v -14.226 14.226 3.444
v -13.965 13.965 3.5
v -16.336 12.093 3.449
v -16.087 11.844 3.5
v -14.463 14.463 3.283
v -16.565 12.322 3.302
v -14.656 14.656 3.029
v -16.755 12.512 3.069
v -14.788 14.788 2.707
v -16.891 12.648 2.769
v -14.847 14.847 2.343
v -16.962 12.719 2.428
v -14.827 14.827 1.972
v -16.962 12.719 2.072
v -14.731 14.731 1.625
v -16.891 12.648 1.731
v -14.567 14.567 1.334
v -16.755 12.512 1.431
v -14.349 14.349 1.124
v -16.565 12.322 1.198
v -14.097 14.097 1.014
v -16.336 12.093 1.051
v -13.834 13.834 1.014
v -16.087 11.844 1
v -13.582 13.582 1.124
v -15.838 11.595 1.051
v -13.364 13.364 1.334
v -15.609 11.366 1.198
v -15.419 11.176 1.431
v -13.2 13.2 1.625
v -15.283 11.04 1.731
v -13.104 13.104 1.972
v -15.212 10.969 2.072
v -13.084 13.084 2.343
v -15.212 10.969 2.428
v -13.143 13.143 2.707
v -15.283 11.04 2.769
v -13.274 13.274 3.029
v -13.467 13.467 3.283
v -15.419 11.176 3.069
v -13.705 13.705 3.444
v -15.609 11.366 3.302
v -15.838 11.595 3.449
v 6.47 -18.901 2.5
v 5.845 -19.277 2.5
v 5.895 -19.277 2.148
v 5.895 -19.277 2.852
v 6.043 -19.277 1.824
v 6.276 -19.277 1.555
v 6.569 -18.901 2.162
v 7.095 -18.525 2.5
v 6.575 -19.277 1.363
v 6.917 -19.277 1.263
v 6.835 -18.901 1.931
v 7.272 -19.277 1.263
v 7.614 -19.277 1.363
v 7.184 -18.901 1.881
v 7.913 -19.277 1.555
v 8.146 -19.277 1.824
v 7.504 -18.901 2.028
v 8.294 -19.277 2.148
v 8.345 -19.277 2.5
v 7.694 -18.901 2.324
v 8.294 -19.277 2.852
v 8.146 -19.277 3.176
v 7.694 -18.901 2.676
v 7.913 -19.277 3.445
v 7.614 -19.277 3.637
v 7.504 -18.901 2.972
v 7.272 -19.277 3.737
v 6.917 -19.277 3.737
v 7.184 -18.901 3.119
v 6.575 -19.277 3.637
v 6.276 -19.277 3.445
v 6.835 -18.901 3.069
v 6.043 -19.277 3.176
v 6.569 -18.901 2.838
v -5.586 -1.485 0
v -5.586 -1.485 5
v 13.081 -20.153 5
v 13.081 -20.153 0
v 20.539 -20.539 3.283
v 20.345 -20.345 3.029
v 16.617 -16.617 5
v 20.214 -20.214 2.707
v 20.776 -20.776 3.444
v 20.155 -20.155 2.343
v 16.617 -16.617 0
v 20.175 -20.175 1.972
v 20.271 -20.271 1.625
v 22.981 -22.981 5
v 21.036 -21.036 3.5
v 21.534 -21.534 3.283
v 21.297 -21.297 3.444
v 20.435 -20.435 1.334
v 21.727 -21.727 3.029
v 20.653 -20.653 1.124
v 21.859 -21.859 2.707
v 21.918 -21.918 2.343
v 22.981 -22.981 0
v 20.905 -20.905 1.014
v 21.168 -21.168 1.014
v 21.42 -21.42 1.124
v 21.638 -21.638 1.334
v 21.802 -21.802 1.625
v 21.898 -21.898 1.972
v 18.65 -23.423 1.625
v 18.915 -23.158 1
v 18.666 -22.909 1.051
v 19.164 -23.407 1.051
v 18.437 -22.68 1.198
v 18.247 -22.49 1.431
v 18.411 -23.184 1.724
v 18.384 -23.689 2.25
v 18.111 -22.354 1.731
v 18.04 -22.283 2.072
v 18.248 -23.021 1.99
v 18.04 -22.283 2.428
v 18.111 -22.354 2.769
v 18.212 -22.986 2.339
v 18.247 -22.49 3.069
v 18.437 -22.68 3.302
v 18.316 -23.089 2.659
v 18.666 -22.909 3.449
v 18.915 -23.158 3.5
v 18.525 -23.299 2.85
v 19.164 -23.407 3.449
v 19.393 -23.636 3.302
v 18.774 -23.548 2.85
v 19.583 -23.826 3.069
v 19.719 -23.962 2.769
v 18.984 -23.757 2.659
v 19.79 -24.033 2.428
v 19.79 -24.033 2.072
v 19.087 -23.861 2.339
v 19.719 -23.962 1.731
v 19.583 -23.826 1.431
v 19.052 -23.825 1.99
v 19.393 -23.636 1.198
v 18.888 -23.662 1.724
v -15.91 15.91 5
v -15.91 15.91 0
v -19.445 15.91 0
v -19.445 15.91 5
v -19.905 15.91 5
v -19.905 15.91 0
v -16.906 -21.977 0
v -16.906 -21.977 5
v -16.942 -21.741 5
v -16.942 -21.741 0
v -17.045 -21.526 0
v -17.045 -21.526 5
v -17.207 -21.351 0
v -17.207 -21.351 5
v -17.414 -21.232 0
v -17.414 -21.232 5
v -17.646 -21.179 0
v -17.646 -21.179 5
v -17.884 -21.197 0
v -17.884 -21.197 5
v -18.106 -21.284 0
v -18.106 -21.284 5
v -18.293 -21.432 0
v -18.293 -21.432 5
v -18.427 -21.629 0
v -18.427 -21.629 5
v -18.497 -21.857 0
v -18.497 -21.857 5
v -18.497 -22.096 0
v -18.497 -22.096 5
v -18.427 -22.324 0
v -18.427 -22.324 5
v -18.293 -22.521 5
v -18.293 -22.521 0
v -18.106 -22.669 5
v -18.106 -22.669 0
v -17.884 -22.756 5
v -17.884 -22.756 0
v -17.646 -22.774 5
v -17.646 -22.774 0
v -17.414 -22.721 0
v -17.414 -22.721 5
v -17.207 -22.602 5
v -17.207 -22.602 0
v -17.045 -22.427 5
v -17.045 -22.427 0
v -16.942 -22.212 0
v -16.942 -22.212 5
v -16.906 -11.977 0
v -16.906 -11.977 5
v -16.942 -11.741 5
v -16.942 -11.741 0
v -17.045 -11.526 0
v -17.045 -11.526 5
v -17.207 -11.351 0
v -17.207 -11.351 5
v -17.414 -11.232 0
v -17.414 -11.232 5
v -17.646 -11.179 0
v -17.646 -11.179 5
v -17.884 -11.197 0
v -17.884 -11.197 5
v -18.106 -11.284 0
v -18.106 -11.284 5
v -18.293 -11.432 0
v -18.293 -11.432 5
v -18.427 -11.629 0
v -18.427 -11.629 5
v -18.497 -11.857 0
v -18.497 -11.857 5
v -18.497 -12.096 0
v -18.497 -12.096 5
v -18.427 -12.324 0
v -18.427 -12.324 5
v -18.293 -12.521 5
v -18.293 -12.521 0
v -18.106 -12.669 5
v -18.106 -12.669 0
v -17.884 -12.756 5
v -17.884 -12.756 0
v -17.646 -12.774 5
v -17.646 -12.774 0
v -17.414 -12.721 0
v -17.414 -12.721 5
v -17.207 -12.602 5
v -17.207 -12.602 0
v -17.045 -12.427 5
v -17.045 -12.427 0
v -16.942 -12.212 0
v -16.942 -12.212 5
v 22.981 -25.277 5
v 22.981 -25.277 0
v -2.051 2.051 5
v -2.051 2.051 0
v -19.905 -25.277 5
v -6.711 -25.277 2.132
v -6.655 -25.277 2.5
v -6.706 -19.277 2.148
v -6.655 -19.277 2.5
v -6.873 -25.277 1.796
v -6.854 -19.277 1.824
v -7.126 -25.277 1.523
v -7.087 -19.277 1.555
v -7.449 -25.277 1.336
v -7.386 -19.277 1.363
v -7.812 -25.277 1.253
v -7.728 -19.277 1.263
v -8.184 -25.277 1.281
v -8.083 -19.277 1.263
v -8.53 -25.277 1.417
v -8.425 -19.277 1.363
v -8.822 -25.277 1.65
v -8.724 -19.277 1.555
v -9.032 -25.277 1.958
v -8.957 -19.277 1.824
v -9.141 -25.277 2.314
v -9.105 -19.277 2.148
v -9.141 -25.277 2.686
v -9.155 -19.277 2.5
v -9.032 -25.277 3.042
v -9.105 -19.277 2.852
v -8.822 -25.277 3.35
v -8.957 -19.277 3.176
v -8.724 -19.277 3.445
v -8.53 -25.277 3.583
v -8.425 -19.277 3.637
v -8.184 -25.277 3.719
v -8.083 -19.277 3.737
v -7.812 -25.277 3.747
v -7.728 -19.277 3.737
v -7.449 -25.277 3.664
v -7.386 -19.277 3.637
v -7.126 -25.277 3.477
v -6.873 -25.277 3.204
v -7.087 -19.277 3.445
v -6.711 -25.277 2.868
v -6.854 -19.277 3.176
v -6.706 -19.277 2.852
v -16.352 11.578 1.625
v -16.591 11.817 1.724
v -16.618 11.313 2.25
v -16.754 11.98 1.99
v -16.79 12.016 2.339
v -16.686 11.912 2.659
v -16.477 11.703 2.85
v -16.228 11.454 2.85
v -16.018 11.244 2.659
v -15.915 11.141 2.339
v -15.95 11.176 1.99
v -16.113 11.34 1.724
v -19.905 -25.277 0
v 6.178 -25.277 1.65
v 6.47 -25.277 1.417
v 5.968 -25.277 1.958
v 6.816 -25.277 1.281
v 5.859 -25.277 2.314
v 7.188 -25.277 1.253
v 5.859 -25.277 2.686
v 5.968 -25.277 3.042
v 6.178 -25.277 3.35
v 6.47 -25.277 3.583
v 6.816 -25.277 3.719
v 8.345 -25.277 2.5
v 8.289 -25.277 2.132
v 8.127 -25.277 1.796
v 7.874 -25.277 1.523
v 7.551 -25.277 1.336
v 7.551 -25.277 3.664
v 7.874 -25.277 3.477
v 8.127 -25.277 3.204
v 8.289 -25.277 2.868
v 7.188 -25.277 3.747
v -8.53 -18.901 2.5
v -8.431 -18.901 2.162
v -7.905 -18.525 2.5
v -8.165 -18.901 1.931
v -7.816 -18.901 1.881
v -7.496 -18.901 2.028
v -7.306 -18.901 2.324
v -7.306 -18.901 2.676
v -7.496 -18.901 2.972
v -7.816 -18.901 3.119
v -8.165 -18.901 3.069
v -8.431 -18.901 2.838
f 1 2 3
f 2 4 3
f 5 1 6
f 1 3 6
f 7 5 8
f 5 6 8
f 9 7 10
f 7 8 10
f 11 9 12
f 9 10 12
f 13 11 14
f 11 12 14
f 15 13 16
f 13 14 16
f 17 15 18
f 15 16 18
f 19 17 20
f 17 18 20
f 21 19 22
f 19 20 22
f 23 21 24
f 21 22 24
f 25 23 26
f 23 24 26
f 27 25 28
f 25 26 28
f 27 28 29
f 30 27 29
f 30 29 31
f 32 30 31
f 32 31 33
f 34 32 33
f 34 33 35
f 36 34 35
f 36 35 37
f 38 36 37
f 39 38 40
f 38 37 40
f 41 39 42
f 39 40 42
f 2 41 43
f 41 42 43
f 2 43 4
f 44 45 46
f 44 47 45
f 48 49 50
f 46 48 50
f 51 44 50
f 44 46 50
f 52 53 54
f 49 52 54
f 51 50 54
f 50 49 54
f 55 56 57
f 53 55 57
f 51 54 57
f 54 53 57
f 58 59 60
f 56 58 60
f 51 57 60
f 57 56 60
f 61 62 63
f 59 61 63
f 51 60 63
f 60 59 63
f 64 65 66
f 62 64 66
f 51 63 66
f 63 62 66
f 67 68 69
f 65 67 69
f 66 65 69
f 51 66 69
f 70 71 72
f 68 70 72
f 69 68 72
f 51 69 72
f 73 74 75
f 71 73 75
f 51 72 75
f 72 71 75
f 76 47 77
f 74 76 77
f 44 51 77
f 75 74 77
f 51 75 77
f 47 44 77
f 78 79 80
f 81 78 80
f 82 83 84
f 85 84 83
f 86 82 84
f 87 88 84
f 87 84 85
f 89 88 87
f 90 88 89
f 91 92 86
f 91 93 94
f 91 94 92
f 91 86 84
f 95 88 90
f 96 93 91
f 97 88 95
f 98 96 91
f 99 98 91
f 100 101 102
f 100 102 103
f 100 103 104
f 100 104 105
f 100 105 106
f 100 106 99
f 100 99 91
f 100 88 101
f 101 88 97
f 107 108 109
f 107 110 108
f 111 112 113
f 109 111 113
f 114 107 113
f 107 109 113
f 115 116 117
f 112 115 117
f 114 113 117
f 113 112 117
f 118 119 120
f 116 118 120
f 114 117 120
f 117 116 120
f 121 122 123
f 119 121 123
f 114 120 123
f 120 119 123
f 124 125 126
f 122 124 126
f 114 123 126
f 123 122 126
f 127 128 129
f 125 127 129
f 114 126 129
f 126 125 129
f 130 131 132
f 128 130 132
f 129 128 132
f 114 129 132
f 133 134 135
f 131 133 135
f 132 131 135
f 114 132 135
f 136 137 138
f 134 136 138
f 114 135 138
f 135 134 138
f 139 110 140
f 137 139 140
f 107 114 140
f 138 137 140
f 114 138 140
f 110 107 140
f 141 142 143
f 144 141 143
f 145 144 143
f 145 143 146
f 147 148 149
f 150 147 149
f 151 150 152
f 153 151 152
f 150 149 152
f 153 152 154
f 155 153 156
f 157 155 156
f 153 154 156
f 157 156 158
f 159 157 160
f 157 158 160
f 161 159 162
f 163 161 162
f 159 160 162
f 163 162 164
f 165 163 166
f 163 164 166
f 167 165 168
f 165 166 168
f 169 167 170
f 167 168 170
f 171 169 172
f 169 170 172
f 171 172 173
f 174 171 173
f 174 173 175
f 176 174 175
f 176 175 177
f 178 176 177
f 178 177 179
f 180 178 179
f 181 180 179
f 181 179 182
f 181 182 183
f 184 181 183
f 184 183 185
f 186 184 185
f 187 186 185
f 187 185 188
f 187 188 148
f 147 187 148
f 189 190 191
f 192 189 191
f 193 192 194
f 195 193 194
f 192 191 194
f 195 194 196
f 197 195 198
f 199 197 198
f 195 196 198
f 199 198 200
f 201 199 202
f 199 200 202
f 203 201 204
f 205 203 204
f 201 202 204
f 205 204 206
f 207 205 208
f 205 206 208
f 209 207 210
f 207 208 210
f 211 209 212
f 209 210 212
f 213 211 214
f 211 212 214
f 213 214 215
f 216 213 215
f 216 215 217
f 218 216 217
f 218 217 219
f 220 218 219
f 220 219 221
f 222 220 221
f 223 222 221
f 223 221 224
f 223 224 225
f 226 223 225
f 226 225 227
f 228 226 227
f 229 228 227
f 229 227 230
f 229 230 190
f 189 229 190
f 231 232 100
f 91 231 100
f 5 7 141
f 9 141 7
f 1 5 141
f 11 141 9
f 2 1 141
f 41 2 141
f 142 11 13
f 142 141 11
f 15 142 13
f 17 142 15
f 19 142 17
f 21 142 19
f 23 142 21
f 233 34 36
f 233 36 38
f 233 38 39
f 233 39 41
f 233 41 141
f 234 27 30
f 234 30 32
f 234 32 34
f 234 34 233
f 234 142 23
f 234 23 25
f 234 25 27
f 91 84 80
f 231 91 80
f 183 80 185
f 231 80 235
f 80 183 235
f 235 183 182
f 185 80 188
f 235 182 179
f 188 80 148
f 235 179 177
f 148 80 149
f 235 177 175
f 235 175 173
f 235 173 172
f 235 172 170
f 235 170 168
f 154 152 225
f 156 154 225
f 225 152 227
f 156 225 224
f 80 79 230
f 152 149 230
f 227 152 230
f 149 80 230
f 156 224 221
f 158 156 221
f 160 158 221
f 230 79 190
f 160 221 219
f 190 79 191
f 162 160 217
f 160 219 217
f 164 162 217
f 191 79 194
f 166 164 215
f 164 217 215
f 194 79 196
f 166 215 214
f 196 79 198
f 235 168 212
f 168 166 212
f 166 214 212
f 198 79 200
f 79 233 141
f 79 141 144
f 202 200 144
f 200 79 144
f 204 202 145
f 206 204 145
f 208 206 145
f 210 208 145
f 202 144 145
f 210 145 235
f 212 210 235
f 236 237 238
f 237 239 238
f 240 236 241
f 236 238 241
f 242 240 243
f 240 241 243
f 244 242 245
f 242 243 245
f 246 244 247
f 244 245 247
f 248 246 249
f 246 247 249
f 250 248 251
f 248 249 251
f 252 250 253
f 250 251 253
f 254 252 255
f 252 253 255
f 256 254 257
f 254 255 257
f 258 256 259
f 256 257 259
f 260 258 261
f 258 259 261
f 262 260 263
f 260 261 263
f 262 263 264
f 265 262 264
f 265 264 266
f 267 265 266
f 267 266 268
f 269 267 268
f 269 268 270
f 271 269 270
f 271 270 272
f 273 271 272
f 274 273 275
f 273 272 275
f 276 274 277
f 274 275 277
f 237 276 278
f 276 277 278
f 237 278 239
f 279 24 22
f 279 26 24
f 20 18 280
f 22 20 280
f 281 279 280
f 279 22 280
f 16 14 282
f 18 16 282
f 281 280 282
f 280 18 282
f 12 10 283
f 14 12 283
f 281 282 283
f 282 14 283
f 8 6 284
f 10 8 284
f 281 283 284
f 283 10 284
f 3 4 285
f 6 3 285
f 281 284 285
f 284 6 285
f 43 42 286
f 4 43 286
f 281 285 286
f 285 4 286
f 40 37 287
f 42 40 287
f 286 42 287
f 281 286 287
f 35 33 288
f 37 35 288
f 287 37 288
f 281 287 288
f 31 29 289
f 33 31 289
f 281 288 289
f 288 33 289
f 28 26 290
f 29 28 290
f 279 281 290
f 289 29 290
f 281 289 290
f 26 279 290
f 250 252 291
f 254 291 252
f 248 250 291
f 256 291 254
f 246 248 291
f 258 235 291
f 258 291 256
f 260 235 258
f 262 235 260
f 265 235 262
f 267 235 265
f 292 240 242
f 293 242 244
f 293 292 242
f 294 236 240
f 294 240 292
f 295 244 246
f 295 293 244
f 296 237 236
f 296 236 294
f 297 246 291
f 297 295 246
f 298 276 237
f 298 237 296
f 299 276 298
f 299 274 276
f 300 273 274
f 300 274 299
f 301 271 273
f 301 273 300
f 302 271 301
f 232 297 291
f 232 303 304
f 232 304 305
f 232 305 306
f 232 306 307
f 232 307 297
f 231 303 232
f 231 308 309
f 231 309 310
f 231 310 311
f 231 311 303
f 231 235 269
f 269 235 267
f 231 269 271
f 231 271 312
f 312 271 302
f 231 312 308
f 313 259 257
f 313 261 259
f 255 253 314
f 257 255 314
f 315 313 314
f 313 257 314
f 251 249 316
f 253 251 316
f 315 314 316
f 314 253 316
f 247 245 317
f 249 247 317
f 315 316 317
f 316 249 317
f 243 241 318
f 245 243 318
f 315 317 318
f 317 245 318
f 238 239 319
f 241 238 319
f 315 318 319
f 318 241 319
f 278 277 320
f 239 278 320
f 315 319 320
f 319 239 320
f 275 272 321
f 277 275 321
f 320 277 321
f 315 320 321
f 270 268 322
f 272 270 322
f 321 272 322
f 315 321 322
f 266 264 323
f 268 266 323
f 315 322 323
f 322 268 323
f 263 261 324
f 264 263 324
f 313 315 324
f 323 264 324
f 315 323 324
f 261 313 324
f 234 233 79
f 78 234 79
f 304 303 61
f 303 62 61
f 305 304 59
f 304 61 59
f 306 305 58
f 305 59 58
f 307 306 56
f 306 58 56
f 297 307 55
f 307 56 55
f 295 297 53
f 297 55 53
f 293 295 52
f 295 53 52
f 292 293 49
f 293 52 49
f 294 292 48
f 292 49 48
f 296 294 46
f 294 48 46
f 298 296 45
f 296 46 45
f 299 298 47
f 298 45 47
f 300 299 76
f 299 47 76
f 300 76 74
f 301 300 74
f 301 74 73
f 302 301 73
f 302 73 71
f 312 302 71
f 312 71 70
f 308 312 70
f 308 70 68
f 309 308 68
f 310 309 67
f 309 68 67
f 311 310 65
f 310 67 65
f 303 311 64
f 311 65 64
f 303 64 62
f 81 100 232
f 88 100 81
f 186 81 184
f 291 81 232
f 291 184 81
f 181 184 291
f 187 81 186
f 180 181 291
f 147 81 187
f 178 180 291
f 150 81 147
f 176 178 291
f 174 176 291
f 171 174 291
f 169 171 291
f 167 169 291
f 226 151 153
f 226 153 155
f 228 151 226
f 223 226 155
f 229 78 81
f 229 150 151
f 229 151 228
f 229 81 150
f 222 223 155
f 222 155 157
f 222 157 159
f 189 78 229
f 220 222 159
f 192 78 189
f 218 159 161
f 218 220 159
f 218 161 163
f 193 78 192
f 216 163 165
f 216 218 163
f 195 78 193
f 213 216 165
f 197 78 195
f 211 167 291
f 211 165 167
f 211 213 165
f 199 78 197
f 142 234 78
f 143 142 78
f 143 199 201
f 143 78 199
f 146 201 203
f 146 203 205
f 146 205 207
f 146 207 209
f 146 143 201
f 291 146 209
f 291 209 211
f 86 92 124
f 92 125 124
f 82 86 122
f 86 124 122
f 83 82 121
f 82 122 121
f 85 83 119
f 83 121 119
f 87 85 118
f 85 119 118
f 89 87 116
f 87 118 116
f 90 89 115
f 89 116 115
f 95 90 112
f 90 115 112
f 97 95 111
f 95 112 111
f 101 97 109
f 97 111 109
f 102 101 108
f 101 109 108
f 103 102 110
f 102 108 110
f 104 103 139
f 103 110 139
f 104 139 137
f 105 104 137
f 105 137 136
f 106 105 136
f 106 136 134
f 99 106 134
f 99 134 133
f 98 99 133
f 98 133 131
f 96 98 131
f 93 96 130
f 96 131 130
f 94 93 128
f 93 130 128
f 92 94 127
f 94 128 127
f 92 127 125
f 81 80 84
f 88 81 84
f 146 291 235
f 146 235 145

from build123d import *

# Parameters (mm, degrees)
BOSS_EXTRUDE1_DEPTH       = 5
M3X0_5_TAPPED_HOLE1_D     = 2.5
M3X0_5_TAPPED_HOLE1_DEPTH = 3
M3X0_5_TAPPED_HOLE1_TIP   = 0.751075774
BOSS_EXTRUDE2_DEPTH       = 5
CUT_EXTRUDE1_DEPTH        = 6
CUT_EXTRUDE2_DEPTH        = 6
BOSS_EXTRUDE3_DEPTH       = 5
BOSS_EXTRUDE4_DEPTH       = 5
SKETCH15_W                = 42.426406872
SKETCH15_H                = 0.46
BOSS_EXTRUDE6_DEPTH       = 5
SKETCH16_W                = 0.46
SKETCH16_H                = 42.886406871
BOSS_EXTRUDE7_DEPTH       = 5
M2X0_4_TAPPED_HOLE1_D     = 1.6
M2X0_4_TAPPED_HOLE1_DEPTH = 6
M2X0_4_TAPPED_HOLE1_TIP   = 0.480688495
SKETCH21_W                = 42.886406872
SKETCH21_H                = 1.7
CUT_EXTRUDE3_DEPTH        = 6
M3X0_5_TAPPED_HOLE3_D     = 2.5
M3X0_5_TAPPED_HOLE3_DEPTH = 6
M3X0_5_TAPPED_HOLE3_TIP   = 0.751075774


with BuildPart() as part:
    # Sketch2 → Boss-Extrude1 (new body)
    with BuildSketch(Plane.XY):
        Polygon((-19.445436483, 19.445436483), (26.516504294, -26.516504294), (-19.445436483, -26.516504294), align=None)
    extrude(amount=BOSS_EXTRUDE1_DEPTH)

    # M3x0.5 Tapped Hole1
    with Locations(Plane(origin=(0, 0, 0), x_dir=(0, 0, -1), z_dir=(0.707106781, 0.707106781, 0))):
        with Locations((-2.25, 19.75), (-2.25, -29.75)):
            Hole(M3X0_5_TAPPED_HOLE1_D / 2, depth=M3X0_5_TAPPED_HOLE1_DEPTH)
            with Locations((0, 0, -(M3X0_5_TAPPED_HOLE1_DEPTH + M3X0_5_TAPPED_HOLE1_TIP / 2))):  # 118° drill point
                Cone(0, M3X0_5_TAPPED_HOLE1_D / 2, M3X0_5_TAPPED_HOLE1_TIP, mode=Mode.SUBTRACT)

    # Sketch6 → Boss-Extrude2 (add, through all)
    with BuildSketch(Plane.XY.offset(5)):
        Polygon((-19.445436483, 19.445436483), (-15.909902577, 15.909902577), (-14.495689014, 17.324116139), (-18.03122292, 20.859650045), align=None)
        Polygon((26.516504294, -26.516504294), (22.980970389, -22.980970389), (24.395183951, -21.566756826), (27.930717857, -25.102290732), align=None)
    extrude(amount=-BOSS_EXTRUDE2_DEPTH)

    # Sketch7 → Cut-Extrude1 (cut, through all)
    with BuildSketch(Plane.XY.offset(5)):
        Polygon((-2.050609665, 2.050609665), (-5.586143571, -1.48492424), (13.081475452, -20.152543264), (16.617009358, -16.617009358), align=None)
    extrude(amount=-CUT_EXTRUDE1_DEPTH, mode=Mode.SUBTRACT)

    # Sketch9 → Cut-Extrude2 (cut, through all)
    with BuildSketch(Plane.XY.offset(5)):
        Polygon((-15.909902577, 15.909902577), (-19.445436483, 12.374368671), (-19.445436483, 19.445436483), (-18.03122292, 20.859650045), (-14.495689014, 17.324116139), align=None)
        Polygon((27.930717857, -25.102290732), (24.395183951, -21.566756826), (19.445436483, -26.516504294), (26.516504294, -26.516504294), align=None)
    extrude(amount=-CUT_EXTRUDE2_DEPTH, mode=Mode.SUBTRACT)

    # Sketch13 → Boss-Extrude3 (add, through all)
    with BuildSketch(Plane.XY.offset(5)):
        Polygon((22.980970389, -22.980970389), (19.445436483, -26.516504294), (22.980970389, -26.516504294), align=None)
    extrude(amount=-BOSS_EXTRUDE3_DEPTH)

    # Sketch14 → Boss-Extrude4 (add, through all)
    with BuildSketch(Plane.XY.offset(5)):
        Polygon((-19.445436483, 12.374368671), (-19.445436483, 15.909902577), (-15.909902577, 15.909902577), align=None)
    extrude(amount=-BOSS_EXTRUDE4_DEPTH)

    # Sketch15 → Boss-Extrude6 (add, through all)
    with BuildSketch(Plane(origin=(0, 0, 0), x_dir=(-1, 0, 0), z_dir=(0, 0, -1))):
        with Locations((-1.767766953, -26.746504294)):
            Rectangle(SKETCH15_W, SKETCH15_H)
    extrude(amount=-BOSS_EXTRUDE6_DEPTH)

    # Sketch16 → Boss-Extrude7 (add, through all)
    with BuildSketch(Plane(origin=(0, 0, 0), x_dir=(-1, 0, 0), z_dir=(0, 0, -1))):
        with Locations((19.675436483, -5.533300859)):
            Rectangle(SKETCH16_W, SKETCH16_H)
    extrude(amount=-BOSS_EXTRUDE7_DEPTH)

    # M2x0.4 Tapped Hole1
    with Locations(Plane(origin=(0, 0, 0), x_dir=(-1, 0, 0), z_dir=(0, 0, -1))):
        with Locations((17.70619852, -11.976504294), (17.70619852, -21.976504294)):
            Hole(M2X0_4_TAPPED_HOLE1_D / 2, depth=M2X0_4_TAPPED_HOLE1_DEPTH)
            with Locations((0, 0, -(M2X0_4_TAPPED_HOLE1_DEPTH + M2X0_4_TAPPED_HOLE1_TIP / 2))):  # 118° drill point
                Cone(0, M2X0_4_TAPPED_HOLE1_D / 2, M2X0_4_TAPPED_HOLE1_TIP, mode=Mode.SUBTRACT)

    # Sketch21 → Cut-Extrude3 (cut, through all)
    with BuildSketch(Plane.XY.offset(5)):
        with Locations((1.537766953, -26.126504294)):
            Rectangle(SKETCH21_W, SKETCH21_H)
    extrude(amount=-CUT_EXTRUDE3_DEPTH, mode=Mode.SUBTRACT)

    # M3x0.5 Tapped Hole3
    with Locations(Plane(origin=(0, -25.276504294, 0), x_dir=(-1, 0, 0), z_dir=(0, -1, 0))):
        with Locations((7.905436483, -2.5), (-7.094563517, -2.5)):
            Hole(M3X0_5_TAPPED_HOLE3_D / 2, depth=M3X0_5_TAPPED_HOLE3_DEPTH)
            with Locations((0, 0, -(M3X0_5_TAPPED_HOLE3_DEPTH + M3X0_5_TAPPED_HOLE3_TIP / 2))):  # 118° drill point
                Cone(0, M3X0_5_TAPPED_HOLE3_D / 2, M3X0_5_TAPPED_HOLE3_TIP, mode=Mode.SUBTRACT)


solid = part.part
